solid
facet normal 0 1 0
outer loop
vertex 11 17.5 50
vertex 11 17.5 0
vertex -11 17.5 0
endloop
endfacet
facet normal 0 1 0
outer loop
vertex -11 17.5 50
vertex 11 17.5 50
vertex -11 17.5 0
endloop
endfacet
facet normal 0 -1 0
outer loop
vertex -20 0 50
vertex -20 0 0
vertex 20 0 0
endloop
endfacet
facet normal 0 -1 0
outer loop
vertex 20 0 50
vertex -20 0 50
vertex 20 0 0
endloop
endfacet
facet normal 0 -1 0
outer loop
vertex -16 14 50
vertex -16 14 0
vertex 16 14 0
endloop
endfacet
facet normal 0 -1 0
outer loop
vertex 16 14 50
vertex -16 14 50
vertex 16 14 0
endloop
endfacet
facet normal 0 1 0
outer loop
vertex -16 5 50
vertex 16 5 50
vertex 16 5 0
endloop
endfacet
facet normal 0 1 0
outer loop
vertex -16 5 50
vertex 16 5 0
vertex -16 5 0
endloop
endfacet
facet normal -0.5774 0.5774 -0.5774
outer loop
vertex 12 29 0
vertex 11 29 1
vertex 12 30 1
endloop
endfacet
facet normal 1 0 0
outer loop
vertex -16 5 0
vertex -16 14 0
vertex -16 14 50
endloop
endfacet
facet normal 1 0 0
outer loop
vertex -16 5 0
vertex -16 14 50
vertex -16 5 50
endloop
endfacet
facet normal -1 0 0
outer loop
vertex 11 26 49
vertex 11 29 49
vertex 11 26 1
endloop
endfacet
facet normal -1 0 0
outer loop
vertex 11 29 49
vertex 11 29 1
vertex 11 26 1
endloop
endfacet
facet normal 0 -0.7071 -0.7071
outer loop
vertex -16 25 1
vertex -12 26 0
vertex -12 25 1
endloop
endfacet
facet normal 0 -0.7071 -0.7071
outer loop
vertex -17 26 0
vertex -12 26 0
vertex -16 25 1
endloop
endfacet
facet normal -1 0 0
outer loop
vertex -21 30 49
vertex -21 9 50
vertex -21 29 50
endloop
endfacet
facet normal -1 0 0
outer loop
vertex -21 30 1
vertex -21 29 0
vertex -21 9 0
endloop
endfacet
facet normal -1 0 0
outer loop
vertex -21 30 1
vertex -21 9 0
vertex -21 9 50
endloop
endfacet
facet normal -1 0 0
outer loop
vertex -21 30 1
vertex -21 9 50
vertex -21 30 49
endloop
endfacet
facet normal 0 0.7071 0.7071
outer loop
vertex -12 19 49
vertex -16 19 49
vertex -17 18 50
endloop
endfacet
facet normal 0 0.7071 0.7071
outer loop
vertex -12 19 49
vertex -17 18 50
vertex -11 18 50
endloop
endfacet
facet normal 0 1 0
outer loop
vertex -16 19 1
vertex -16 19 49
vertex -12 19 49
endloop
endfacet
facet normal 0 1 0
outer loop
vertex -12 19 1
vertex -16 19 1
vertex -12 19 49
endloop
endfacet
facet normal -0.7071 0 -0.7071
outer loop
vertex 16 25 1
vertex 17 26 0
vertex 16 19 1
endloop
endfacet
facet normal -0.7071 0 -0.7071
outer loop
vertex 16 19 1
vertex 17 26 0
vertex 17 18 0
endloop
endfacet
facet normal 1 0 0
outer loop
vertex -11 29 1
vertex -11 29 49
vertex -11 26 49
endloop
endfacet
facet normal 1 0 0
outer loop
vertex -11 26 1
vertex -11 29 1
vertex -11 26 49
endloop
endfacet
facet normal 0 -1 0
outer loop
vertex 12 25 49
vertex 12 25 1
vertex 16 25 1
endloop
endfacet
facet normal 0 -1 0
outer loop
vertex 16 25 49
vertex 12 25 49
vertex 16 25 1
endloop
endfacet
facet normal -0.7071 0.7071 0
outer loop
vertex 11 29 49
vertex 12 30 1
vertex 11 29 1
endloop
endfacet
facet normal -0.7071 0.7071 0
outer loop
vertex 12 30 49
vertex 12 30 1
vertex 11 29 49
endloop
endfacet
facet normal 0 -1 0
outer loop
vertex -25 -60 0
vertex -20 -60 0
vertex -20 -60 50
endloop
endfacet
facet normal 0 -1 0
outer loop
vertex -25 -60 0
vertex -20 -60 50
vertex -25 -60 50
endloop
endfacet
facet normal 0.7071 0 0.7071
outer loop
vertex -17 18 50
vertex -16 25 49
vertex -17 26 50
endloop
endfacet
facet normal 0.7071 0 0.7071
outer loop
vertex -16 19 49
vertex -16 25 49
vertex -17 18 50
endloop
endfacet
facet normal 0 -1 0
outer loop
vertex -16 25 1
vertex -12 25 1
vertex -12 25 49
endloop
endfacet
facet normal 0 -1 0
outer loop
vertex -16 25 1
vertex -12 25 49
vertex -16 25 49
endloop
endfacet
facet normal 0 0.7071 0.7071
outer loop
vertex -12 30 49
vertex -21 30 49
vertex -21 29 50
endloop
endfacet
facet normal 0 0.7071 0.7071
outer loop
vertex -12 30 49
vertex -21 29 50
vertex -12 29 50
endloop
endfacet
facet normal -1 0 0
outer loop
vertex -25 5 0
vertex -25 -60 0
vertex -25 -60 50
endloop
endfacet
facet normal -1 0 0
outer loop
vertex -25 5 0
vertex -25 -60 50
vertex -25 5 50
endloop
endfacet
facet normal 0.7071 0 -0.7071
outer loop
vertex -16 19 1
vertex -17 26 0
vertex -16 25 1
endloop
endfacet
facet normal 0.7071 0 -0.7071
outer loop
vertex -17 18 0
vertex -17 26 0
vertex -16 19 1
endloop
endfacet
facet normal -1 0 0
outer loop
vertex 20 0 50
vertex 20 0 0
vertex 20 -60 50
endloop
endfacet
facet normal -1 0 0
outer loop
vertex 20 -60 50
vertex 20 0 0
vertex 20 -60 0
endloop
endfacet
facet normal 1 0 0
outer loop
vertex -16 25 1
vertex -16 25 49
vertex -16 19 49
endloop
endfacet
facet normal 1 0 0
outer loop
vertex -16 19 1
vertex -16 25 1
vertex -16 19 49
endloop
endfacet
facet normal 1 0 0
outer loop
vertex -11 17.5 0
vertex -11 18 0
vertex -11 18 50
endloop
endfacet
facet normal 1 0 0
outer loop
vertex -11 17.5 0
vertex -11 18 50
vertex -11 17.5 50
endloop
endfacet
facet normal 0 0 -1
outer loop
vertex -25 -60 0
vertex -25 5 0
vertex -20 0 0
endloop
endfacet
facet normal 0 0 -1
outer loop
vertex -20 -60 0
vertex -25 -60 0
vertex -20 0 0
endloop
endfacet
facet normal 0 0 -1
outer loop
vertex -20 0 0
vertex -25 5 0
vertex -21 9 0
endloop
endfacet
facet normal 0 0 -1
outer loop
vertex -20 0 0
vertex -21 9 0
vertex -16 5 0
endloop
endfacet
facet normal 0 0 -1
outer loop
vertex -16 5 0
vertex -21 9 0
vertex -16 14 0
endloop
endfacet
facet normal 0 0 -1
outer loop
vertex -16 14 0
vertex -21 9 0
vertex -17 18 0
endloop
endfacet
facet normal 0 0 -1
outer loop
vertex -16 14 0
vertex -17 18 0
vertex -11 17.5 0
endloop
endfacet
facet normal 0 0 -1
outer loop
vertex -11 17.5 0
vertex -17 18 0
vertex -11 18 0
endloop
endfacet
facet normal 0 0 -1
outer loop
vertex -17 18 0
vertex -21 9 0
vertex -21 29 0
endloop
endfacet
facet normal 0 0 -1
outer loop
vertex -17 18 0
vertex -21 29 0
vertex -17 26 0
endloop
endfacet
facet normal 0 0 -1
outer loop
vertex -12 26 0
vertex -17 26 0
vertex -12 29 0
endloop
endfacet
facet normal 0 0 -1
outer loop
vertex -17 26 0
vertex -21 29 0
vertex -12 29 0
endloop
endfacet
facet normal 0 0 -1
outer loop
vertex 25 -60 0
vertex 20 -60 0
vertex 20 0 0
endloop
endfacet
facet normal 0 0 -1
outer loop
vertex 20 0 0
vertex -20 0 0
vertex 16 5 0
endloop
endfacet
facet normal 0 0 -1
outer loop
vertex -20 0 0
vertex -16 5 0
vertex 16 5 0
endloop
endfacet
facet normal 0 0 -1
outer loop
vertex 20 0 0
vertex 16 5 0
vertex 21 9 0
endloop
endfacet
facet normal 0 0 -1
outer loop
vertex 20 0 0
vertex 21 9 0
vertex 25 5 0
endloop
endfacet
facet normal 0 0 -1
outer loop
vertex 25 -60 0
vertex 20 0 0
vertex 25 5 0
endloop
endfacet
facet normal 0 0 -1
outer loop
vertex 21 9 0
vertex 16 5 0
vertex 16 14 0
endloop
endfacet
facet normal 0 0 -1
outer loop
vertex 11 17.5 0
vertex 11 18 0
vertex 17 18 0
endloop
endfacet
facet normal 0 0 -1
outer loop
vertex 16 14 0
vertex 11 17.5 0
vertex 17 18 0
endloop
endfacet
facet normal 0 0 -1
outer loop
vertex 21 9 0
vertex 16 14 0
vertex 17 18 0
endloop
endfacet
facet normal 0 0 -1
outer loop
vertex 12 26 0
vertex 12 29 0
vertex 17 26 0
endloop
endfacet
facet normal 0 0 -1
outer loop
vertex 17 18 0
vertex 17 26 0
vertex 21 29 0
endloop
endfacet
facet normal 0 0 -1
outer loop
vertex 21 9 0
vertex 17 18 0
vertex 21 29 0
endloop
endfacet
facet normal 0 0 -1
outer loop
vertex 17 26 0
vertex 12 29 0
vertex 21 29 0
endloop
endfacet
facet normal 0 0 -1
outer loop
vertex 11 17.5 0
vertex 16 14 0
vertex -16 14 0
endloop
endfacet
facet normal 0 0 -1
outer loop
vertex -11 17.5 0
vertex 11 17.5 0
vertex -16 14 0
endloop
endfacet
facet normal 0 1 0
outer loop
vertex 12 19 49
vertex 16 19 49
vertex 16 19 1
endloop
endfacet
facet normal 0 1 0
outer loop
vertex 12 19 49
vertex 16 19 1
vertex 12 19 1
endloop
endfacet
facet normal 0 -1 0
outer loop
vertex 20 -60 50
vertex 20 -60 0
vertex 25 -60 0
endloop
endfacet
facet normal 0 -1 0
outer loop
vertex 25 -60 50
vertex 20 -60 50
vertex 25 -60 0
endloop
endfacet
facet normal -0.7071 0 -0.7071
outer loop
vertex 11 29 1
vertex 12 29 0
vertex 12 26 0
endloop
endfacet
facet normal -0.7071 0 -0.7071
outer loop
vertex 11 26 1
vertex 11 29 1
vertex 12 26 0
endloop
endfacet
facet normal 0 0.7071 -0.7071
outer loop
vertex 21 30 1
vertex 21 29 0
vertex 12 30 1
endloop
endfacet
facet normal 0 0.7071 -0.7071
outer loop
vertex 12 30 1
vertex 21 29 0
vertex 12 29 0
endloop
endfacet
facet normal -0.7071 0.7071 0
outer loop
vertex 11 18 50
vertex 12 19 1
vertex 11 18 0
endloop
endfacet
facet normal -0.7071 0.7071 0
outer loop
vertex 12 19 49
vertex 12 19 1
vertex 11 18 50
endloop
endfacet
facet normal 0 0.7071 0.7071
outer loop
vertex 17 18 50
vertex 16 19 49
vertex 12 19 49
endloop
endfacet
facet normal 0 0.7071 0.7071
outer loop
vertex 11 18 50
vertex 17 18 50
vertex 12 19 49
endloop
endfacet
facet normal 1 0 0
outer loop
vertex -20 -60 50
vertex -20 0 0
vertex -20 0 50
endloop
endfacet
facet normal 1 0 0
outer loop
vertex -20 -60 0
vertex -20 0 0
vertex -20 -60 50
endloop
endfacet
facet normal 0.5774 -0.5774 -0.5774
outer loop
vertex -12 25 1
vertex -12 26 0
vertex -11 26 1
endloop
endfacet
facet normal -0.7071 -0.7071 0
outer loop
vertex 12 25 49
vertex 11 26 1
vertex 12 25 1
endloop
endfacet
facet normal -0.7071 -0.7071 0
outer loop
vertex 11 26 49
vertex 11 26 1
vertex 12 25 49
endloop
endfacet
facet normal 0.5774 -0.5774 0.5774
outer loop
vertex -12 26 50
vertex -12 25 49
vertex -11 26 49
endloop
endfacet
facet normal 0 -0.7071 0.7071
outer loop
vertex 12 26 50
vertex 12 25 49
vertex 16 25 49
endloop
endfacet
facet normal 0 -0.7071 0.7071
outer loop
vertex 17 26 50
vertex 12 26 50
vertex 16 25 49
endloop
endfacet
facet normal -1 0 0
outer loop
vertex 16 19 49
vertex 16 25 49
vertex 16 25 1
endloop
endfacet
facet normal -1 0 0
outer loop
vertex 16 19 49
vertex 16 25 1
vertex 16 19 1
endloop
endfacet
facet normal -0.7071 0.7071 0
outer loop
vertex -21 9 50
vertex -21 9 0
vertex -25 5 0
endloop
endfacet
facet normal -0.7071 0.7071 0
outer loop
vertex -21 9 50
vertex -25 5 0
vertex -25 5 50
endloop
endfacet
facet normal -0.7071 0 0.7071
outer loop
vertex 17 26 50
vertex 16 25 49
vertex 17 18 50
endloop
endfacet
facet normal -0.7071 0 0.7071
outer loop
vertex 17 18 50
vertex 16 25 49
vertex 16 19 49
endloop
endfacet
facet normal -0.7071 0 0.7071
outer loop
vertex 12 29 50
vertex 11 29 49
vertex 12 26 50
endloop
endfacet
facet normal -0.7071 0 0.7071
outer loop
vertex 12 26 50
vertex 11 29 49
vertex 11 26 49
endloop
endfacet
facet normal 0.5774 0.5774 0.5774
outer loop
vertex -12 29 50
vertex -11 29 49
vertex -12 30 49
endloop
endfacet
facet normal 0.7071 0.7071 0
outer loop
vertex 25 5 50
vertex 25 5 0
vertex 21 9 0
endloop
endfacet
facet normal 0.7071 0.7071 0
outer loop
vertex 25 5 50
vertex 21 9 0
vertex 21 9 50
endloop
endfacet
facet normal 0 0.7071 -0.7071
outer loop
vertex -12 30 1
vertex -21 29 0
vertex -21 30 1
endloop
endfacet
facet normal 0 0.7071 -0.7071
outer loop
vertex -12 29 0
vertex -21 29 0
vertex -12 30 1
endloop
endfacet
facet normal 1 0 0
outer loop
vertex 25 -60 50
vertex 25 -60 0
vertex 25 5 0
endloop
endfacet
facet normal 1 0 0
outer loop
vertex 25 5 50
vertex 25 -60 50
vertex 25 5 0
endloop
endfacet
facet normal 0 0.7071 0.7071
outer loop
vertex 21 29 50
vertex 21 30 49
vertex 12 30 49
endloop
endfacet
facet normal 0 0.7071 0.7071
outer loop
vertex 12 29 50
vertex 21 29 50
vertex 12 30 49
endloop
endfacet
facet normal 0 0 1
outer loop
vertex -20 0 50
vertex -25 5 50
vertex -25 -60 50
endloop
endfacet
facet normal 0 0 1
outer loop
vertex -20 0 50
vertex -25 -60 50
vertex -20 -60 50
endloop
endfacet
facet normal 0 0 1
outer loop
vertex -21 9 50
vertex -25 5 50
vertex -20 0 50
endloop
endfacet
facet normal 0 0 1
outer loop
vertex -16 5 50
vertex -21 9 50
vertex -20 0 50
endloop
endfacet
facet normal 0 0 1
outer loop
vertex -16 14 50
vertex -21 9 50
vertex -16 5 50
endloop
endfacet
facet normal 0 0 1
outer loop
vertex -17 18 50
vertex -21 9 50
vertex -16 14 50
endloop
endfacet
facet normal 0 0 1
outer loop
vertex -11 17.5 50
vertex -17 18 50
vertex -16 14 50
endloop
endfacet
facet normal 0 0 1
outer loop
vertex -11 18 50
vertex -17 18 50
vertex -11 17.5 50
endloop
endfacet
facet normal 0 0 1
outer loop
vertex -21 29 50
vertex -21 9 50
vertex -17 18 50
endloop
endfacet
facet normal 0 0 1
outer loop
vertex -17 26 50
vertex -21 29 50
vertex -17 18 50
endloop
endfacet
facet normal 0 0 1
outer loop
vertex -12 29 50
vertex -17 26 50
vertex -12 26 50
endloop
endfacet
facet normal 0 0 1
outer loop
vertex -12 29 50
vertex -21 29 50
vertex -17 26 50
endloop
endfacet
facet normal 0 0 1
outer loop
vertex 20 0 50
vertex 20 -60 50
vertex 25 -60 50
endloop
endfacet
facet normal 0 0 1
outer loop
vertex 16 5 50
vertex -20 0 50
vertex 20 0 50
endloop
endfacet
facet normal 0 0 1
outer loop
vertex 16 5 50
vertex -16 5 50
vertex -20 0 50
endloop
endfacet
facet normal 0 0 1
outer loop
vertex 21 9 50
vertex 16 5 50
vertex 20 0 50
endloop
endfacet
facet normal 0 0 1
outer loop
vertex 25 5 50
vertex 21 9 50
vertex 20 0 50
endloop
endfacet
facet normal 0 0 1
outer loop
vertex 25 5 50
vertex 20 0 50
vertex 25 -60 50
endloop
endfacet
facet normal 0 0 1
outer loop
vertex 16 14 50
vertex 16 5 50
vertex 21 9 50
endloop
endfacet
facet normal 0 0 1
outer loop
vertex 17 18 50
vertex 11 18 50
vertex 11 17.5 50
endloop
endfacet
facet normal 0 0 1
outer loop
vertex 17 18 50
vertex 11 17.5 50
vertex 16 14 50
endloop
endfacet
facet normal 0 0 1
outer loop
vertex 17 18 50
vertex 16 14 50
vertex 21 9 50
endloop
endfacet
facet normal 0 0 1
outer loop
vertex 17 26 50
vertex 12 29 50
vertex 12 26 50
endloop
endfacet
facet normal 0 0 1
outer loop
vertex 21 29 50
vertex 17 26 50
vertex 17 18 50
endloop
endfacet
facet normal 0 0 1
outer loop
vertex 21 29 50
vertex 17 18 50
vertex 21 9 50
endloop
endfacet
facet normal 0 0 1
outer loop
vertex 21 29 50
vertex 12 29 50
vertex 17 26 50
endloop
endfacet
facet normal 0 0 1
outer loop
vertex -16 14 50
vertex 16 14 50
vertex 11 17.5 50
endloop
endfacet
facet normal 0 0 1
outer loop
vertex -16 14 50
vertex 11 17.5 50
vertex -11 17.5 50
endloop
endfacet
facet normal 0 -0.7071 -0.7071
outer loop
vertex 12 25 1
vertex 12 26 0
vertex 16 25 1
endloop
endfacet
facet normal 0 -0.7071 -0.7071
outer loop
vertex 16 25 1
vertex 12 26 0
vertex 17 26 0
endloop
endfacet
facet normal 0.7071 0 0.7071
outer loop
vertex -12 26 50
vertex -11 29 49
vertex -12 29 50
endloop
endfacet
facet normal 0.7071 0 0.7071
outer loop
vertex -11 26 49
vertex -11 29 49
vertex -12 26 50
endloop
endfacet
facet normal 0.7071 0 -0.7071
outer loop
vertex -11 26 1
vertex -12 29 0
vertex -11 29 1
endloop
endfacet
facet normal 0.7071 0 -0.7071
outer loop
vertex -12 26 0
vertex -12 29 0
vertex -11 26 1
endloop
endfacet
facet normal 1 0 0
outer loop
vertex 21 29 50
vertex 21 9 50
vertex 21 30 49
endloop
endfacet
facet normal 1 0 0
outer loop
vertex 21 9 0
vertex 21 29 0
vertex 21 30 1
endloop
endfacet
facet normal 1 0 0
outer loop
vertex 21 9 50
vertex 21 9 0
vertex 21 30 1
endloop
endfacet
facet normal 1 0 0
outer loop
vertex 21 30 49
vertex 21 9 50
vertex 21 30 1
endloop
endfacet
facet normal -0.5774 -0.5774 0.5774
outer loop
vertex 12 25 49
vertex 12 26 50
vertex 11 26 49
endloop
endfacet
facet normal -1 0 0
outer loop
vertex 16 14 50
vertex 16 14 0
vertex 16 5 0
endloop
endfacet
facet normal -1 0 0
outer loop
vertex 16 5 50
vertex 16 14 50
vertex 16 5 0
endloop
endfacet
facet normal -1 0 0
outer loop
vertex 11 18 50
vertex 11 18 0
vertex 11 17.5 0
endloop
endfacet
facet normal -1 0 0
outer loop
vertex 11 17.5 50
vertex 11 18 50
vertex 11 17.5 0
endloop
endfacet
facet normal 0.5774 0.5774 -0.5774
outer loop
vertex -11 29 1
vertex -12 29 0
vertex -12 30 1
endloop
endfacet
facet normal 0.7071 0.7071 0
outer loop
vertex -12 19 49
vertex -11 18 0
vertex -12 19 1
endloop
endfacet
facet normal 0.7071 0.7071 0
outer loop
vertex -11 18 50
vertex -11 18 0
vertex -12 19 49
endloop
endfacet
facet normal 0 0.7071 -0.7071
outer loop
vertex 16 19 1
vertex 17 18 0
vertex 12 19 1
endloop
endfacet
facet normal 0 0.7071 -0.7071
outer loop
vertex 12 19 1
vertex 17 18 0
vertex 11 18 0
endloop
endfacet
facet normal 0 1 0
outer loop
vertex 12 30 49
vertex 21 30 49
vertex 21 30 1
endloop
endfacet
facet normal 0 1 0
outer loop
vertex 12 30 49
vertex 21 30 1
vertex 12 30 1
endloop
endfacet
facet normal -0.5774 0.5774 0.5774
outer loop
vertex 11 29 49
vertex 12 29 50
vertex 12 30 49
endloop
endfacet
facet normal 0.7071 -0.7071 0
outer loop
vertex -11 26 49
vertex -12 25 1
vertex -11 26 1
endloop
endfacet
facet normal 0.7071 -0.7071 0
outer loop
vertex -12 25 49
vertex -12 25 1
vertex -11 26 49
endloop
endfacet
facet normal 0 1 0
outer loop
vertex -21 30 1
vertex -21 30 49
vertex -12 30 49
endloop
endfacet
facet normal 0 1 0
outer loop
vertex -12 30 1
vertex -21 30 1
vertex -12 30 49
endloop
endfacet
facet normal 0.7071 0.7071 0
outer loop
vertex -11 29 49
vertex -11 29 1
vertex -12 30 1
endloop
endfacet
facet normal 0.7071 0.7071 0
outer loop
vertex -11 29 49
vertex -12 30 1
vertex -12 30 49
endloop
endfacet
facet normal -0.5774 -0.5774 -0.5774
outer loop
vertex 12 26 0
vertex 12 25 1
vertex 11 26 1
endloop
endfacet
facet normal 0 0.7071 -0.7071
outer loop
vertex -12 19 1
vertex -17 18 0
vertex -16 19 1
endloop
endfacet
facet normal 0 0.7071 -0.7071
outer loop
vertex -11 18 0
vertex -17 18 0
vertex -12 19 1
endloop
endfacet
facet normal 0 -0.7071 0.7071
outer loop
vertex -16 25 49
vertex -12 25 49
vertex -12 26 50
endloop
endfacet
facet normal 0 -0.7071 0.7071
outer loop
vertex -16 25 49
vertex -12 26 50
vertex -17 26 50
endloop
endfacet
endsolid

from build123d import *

# Parameters (mm, degrees)
BOSS_EXTRUDE1_DEPTH = 50
CHAMFER2_SIZE       = 1
CHAMFER3_SIZE       = 4


with BuildPart() as part:
    # Sketch1 → Boss-Extrude1 (new body)
    with BuildSketch(Plane.XY):
        Polygon((0, 0), (-20, 0), (-20, -60), (-25, -60), (-25, 5), (-21, 5), (-21, 30), (-11, 30), (-11, 25), (-16, 25), (-16, 19), (-11, 19), (-11, 17.5), (0, 17.5), (0, 14), (-16, 14), (-16, 5), (0, 5), align=None)
    boss_extrude1 = extrude(amount=BOSS_EXTRUDE1_DEPTH)

    # Mirror1: Boss-Extrude1 across plane
    add(boss_extrude1.mirror(Plane(origin=(0, 5, 50), x_dir=(0, 0, 1), z_dir=(-1, 0, 0))))

    # Chamfer2
    chamfer2_edges = [part.edges().sort_by_distance(p)[0] for p in [
        (-16, 30, 0),
        (-11, 27.5, 0),
        (-13.5, 25, 0),
        (-16, 22, 0),
        (-13.5, 19, 0),
        (-11, 30, 25),
        (-11, 25, 25),
        (-11, 19, 25),
        (-13.5, 19, 50),
        (-16, 22, 50),
        (-13.5, 25, 50),
        (-11, 27.5, 50),
        (-16, 30, 50),
        (16, 30, 50),
        (11, 27.5, 50),
        (11, 30, 25),
        (13.5, 25, 50),
        (11, 25, 25),
        (16, 22, 50),
        (13.5, 19, 50),
        (11, 19, 25),
        (13.5, 19, 0),
        (16, 22, 0),
        (13.5, 25, 0),
        (11, 27.5, 0),
        (16, 30, 0),
    ]]
    chamfer(chamfer2_edges, length=CHAMFER2_SIZE)

    # Chamfer3
    chamfer3_edges = [part.edges().sort_by_distance(p)[0] for p in [
        (21, 5, 25),
        (-21, 5, 25),
    ]]
    chamfer(chamfer3_edges, length=CHAMFER3_SIZE - 0.0001)  # a hair under: the kernel refuses the full size


solid = part.part
